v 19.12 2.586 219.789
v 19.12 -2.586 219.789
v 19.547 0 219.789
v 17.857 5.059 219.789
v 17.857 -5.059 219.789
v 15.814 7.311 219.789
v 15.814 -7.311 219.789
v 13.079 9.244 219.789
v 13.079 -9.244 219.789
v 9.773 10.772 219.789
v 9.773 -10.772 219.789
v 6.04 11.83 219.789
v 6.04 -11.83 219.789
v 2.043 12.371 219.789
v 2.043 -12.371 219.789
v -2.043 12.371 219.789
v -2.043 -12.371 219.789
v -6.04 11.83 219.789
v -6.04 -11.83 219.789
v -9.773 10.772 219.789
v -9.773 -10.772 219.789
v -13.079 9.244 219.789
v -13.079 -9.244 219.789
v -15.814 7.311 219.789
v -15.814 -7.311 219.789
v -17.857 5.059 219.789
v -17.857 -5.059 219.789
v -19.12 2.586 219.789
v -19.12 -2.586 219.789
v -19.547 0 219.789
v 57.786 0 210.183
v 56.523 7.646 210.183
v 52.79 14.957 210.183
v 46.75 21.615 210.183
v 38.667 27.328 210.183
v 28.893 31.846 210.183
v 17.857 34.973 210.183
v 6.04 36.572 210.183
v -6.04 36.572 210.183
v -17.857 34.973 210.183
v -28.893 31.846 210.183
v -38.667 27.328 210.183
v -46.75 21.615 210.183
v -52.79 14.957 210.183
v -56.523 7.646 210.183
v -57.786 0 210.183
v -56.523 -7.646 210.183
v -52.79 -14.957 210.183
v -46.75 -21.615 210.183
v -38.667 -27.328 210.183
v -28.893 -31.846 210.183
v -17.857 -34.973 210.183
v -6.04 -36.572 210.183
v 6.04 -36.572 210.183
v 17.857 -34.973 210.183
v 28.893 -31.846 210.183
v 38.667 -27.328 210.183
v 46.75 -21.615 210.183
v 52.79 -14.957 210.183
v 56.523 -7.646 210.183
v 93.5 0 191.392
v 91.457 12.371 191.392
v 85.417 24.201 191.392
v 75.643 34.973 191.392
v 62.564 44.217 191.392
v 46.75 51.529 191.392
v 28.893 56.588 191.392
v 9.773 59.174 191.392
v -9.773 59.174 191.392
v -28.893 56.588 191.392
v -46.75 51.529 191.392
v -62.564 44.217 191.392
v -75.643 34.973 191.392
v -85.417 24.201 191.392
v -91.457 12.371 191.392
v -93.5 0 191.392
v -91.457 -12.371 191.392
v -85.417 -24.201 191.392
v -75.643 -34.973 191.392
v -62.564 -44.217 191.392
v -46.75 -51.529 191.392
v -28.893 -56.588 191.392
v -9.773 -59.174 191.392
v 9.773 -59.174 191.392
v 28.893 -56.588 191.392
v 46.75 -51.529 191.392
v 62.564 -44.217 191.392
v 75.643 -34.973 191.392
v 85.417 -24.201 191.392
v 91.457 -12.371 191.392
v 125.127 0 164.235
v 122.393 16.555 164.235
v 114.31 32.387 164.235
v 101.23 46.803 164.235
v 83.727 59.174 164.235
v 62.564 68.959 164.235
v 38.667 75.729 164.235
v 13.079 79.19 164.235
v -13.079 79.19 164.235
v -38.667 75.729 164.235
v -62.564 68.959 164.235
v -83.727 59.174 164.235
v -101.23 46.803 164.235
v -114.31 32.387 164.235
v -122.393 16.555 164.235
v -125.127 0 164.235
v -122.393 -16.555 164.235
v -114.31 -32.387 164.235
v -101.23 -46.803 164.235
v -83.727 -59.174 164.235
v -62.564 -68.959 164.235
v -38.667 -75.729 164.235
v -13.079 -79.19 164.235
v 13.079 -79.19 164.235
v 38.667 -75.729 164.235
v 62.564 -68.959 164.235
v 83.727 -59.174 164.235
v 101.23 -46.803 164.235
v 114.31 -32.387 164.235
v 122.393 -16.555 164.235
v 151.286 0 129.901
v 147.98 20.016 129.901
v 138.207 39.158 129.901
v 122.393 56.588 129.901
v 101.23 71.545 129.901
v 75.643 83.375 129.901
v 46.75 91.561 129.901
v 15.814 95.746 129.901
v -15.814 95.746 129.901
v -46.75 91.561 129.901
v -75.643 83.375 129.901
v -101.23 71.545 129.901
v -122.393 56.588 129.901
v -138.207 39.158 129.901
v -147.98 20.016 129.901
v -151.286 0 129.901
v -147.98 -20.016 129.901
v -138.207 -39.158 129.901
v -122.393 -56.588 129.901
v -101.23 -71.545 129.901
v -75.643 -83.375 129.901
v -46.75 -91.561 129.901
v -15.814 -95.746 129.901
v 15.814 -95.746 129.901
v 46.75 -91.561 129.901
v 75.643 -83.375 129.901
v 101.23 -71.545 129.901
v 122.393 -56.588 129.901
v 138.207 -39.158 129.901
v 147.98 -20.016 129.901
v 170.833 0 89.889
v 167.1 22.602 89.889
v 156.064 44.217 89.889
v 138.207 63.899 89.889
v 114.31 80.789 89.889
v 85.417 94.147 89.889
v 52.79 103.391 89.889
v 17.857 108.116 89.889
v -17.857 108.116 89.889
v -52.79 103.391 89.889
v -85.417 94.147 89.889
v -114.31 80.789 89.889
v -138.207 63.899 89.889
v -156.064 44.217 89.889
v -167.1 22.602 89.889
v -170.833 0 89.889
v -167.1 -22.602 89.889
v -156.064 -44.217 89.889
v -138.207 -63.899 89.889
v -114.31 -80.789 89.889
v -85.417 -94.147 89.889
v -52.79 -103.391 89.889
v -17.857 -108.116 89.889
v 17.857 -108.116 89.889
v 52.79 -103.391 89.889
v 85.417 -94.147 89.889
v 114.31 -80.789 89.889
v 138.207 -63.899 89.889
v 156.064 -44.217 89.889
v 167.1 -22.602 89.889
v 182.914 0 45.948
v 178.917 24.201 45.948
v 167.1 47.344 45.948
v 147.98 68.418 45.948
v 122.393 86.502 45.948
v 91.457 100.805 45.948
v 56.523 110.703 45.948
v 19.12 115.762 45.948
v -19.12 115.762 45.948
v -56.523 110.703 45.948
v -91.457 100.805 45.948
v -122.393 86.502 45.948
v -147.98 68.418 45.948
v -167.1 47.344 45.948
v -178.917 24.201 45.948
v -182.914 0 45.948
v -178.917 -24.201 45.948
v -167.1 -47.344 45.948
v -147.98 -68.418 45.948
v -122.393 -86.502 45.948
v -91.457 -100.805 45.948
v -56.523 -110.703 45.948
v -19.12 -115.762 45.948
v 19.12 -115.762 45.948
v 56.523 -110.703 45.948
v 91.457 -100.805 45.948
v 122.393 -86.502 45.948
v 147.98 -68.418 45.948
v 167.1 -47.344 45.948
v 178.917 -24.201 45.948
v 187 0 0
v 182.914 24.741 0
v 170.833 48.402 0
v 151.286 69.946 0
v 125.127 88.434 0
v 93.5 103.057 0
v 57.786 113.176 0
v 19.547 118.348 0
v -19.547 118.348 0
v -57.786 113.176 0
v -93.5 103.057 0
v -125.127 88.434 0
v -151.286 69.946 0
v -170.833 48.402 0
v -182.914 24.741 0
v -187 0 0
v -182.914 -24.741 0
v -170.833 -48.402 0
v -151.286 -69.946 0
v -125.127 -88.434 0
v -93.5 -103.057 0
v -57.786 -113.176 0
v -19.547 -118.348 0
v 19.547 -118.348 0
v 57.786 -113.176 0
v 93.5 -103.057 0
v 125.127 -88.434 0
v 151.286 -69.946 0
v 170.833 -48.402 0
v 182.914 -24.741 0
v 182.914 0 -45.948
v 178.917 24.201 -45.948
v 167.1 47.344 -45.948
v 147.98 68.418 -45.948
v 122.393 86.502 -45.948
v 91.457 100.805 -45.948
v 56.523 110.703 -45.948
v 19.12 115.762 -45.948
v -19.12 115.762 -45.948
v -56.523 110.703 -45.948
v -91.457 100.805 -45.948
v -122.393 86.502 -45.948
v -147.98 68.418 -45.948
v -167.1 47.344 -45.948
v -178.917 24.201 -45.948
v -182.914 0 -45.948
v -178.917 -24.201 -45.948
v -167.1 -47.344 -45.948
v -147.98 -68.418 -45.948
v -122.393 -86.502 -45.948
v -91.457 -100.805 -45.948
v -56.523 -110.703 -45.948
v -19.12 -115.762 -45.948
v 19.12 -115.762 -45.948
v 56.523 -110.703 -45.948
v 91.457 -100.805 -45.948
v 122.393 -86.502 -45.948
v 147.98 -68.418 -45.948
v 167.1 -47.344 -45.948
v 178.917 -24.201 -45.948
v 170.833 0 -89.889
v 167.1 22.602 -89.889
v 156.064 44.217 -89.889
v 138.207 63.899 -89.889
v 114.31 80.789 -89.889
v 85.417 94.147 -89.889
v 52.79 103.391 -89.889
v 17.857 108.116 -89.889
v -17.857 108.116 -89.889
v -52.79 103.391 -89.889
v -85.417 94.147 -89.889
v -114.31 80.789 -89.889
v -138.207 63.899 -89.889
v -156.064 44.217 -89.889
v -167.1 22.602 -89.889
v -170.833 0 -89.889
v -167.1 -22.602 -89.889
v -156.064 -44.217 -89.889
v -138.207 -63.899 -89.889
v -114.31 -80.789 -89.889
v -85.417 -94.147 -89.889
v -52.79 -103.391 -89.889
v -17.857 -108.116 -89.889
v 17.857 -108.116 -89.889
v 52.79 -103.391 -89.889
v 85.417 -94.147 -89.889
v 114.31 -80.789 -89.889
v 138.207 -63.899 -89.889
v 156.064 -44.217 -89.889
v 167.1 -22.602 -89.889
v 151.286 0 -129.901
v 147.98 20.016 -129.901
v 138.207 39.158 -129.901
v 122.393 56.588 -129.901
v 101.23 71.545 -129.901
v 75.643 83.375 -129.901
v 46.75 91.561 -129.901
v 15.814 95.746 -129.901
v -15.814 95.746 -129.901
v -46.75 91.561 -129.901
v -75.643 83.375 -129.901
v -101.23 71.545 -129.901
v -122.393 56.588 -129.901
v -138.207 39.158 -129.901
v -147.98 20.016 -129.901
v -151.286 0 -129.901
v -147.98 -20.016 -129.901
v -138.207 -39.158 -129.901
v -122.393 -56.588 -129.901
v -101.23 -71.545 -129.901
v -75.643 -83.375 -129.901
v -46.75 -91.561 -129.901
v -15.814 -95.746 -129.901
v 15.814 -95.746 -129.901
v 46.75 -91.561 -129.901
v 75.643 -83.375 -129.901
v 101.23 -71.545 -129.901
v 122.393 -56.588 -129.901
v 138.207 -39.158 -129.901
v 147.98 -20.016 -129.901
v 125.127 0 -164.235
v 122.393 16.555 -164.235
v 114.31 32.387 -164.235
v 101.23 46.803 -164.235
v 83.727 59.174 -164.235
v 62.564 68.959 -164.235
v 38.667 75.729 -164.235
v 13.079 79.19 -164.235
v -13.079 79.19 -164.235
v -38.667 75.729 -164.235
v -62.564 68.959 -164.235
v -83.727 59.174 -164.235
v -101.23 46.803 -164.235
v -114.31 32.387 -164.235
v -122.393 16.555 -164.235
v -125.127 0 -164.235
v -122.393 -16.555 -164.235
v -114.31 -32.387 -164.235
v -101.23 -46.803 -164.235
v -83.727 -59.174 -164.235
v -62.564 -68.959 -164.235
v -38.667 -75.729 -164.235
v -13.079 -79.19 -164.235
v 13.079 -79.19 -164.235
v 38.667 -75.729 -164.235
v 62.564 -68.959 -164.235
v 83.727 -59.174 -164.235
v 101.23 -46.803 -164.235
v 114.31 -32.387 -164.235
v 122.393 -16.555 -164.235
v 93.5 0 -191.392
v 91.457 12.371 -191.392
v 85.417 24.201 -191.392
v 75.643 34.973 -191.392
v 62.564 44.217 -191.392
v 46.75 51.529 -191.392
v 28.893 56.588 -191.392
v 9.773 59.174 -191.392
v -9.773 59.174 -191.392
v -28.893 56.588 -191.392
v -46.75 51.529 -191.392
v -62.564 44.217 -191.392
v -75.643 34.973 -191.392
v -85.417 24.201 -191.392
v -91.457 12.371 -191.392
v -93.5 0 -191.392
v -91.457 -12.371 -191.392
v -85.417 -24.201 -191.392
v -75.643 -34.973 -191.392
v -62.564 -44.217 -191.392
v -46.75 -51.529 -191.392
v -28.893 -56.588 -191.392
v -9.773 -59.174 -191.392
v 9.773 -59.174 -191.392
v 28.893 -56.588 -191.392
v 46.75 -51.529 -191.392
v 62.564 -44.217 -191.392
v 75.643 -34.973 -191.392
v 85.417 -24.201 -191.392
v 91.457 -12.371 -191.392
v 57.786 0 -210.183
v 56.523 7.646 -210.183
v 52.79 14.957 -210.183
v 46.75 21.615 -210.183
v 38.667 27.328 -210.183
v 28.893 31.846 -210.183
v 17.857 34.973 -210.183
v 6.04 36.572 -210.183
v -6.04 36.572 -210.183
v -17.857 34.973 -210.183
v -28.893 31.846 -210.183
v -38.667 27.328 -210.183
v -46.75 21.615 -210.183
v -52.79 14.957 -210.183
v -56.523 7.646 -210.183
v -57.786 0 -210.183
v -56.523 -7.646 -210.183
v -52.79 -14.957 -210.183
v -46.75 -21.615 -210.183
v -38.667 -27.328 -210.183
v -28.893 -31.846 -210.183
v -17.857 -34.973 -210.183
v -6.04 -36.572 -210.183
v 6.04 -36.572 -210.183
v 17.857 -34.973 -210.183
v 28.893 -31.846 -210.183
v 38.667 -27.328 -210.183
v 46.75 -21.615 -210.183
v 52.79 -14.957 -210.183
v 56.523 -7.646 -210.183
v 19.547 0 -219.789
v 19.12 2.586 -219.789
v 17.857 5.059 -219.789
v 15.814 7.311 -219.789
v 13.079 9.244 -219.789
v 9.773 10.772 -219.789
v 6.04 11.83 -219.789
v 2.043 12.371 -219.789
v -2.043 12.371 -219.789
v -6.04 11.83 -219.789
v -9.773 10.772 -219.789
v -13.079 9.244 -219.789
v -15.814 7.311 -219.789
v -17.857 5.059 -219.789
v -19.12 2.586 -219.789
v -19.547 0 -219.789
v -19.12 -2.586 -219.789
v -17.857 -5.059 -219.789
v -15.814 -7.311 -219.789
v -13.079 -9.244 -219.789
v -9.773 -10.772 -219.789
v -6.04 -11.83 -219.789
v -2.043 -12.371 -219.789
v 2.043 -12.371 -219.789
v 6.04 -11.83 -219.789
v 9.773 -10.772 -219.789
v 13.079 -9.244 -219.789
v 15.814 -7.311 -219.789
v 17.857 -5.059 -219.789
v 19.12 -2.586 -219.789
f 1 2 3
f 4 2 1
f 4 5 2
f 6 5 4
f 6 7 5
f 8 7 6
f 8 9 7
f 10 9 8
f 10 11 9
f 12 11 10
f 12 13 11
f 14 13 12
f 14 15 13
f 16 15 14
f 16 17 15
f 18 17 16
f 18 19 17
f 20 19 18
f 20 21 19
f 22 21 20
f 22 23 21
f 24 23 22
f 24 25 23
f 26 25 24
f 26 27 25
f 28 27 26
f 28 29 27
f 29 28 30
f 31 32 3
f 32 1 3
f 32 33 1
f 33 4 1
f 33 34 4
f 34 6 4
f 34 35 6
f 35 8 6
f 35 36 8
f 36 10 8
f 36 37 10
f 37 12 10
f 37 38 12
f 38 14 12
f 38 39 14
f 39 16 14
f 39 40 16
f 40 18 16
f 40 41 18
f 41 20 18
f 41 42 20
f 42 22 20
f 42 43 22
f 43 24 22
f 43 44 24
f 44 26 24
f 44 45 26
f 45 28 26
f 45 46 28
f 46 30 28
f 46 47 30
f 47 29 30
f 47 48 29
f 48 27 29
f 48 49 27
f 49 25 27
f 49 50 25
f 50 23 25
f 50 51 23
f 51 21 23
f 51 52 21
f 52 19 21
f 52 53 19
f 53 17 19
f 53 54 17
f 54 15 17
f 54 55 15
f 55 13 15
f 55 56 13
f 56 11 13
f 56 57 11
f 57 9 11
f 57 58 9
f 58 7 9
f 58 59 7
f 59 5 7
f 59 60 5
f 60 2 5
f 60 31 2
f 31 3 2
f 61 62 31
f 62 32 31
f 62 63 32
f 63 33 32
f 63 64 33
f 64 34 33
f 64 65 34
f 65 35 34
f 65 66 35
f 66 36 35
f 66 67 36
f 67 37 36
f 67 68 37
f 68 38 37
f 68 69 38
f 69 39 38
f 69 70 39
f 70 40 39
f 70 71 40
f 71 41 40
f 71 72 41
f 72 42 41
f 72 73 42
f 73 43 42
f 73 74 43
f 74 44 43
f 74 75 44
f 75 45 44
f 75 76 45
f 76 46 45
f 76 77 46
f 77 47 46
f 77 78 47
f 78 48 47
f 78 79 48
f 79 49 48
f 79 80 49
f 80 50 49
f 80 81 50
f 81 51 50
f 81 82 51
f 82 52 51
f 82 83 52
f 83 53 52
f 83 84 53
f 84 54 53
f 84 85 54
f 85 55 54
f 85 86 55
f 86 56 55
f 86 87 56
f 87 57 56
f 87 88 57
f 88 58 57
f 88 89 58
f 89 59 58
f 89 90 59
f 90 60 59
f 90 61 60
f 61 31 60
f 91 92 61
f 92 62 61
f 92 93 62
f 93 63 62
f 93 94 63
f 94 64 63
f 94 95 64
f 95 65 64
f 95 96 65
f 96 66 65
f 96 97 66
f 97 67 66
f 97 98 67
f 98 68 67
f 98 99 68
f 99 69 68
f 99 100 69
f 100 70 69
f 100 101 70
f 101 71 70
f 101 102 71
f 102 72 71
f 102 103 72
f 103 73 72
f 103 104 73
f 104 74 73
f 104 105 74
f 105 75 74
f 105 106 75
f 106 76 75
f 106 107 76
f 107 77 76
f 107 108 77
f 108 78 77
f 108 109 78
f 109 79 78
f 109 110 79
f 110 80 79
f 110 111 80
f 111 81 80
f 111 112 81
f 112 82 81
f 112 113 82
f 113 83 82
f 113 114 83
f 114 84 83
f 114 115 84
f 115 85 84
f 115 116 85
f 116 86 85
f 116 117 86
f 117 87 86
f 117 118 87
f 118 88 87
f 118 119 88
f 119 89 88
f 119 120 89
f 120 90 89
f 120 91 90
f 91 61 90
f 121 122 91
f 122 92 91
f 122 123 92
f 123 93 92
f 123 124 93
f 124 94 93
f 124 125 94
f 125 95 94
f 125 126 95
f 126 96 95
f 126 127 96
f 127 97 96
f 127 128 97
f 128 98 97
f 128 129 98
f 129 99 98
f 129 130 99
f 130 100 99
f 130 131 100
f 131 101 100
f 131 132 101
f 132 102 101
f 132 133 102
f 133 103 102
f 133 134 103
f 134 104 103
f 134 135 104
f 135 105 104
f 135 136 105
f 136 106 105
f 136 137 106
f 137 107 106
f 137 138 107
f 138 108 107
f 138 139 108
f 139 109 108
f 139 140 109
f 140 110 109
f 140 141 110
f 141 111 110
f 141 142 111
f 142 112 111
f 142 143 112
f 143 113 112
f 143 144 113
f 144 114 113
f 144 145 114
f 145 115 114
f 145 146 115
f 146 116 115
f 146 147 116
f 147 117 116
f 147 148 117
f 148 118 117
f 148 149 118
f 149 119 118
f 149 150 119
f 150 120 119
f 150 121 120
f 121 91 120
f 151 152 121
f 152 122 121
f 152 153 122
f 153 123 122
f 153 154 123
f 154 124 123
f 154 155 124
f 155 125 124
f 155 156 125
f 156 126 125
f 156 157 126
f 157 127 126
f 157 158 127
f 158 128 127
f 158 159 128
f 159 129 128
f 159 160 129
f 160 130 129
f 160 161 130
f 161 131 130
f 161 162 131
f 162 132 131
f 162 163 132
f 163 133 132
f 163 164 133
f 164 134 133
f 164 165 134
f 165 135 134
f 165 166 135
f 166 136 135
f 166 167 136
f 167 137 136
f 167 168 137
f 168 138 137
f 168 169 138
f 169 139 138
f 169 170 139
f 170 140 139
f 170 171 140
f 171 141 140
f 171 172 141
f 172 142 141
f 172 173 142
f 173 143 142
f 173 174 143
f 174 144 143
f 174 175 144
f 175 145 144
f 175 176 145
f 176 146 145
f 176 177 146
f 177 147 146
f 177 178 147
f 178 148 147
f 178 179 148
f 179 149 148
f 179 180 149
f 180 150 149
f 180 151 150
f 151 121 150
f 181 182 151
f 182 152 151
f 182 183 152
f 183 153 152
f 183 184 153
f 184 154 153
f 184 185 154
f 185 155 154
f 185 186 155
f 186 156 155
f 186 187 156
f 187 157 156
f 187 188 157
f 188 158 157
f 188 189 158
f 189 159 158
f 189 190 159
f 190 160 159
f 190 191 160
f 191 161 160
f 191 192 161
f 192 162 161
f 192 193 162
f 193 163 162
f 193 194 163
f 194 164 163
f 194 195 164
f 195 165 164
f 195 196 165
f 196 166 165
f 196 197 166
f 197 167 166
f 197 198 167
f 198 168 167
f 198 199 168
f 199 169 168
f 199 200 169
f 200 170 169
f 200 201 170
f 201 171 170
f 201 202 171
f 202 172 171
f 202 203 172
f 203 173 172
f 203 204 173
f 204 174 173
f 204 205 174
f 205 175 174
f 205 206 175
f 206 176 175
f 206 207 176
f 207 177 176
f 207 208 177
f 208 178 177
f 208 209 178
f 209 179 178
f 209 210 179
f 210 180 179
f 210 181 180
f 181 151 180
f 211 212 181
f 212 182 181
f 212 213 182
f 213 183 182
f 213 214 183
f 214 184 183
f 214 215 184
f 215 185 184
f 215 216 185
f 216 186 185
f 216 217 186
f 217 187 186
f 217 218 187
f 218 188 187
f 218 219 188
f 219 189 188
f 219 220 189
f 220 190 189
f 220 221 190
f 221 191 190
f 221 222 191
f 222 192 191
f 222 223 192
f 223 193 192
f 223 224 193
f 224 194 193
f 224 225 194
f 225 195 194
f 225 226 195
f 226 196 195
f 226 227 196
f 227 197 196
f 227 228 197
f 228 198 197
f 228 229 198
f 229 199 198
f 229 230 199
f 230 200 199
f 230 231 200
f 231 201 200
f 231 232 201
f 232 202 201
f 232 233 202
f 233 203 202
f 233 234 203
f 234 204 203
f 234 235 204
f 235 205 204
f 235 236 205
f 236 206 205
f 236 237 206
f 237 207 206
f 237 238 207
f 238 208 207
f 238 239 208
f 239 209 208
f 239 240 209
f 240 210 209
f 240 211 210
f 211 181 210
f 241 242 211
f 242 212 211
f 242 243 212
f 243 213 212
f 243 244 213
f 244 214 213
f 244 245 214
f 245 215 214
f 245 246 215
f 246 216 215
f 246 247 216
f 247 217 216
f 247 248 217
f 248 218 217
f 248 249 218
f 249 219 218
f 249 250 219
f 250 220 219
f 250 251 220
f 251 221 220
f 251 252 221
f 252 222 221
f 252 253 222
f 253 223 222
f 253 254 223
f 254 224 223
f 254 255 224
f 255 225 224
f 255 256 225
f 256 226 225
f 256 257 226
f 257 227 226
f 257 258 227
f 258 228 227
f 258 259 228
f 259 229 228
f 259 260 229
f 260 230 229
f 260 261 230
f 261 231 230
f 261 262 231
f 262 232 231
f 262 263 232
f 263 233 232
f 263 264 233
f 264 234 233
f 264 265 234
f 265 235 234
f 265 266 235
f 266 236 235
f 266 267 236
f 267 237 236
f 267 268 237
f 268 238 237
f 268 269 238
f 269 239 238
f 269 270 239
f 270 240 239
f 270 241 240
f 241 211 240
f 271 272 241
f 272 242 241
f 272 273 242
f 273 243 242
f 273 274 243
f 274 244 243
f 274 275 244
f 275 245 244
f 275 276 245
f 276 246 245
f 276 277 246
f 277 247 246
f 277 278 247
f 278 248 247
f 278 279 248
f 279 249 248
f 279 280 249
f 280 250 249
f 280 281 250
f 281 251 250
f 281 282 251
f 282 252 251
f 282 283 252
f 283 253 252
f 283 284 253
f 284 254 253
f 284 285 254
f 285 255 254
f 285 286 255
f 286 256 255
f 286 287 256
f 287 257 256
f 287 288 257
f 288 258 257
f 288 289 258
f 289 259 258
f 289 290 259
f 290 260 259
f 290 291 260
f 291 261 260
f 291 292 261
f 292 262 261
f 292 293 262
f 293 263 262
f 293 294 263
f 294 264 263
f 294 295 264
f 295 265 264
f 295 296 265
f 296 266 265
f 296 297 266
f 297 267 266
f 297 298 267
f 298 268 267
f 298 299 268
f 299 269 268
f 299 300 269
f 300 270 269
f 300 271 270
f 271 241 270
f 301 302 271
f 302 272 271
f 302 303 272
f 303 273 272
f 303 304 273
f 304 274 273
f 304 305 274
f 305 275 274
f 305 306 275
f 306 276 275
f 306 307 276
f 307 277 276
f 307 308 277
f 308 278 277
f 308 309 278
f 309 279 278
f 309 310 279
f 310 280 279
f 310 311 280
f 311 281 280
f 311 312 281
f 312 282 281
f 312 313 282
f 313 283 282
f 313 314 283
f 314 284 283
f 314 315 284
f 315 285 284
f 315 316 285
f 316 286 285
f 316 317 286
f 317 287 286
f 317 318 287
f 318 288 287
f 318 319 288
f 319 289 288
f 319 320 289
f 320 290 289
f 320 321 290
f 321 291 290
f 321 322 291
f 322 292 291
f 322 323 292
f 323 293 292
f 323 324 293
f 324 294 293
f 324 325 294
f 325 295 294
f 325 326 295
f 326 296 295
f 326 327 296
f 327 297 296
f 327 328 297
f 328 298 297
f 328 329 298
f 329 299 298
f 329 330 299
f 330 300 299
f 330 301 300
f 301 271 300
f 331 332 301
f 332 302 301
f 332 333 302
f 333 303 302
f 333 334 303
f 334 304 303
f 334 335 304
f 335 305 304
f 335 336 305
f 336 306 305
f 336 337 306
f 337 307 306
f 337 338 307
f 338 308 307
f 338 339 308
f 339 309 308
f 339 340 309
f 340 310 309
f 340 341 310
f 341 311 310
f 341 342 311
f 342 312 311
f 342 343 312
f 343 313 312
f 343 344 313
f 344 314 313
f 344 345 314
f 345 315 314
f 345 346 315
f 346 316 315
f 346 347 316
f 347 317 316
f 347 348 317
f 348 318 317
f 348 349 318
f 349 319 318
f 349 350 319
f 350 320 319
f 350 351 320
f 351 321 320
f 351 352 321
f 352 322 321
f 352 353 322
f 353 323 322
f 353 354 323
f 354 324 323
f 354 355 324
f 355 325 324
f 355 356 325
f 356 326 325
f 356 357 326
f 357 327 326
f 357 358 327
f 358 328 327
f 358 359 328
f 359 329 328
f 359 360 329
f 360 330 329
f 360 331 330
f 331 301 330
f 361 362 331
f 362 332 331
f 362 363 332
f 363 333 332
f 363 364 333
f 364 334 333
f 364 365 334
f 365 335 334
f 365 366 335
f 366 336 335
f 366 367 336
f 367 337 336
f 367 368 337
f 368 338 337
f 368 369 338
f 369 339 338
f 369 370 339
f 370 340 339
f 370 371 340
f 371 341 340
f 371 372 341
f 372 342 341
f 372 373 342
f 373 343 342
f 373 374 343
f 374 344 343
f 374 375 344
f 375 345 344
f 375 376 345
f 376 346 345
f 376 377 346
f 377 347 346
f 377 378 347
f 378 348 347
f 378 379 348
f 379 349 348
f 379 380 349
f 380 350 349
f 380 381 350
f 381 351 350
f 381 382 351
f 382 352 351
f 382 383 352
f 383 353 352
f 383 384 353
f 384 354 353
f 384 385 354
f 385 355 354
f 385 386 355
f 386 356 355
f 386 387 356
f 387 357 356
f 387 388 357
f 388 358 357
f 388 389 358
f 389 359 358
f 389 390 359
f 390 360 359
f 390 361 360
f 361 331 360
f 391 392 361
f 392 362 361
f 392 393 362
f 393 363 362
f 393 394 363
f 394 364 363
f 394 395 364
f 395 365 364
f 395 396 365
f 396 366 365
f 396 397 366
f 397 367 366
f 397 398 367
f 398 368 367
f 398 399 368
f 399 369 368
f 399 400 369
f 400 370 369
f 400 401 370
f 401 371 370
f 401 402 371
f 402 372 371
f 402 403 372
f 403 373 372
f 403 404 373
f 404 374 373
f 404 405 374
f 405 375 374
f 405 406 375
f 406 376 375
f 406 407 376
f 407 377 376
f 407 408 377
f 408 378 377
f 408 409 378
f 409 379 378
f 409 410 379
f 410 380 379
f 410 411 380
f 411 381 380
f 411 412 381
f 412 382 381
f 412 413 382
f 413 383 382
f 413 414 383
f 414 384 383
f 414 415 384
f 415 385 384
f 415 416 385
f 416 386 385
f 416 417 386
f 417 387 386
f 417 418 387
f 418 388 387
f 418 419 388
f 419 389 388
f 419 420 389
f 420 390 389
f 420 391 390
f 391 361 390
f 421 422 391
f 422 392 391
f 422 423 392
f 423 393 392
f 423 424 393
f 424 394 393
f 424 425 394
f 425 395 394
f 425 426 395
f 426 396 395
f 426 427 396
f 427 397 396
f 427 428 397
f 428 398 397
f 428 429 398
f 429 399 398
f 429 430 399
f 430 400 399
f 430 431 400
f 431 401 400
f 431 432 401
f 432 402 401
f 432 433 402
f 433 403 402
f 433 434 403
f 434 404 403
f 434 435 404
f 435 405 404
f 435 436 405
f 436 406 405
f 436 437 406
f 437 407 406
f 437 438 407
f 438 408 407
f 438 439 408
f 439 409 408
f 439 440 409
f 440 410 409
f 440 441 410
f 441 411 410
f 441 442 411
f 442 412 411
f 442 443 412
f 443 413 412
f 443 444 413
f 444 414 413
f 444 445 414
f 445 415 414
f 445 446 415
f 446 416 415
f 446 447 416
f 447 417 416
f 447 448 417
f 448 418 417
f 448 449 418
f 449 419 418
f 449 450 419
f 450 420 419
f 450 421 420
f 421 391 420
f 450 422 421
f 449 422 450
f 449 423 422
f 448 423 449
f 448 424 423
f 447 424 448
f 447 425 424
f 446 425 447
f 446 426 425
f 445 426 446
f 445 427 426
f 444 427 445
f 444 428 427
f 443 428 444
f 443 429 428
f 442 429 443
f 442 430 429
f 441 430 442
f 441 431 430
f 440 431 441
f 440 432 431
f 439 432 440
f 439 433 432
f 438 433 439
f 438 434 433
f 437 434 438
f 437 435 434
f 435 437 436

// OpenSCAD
// Generated by SolidPython 1.0.1 on 2020-07-29 00:46:49


scale(v = [11, 7, 13]) {
	sphere(r = 17);
}
/***********************************************
*********      SolidPython code:      **********
************************************************
 
# import packages: SolidPython
from solid import *
from solid.utils import *
from itertools import chain, combinations, permutations


class Resize:

    def __init__(self, scad_file):
        self.scad_file = scad_file
        #self.scad_file = import_scad(scad_file)
        # cone/cylinder param:
        self.r1 = 0
        self.r2 = 0
        self.h = 0
        # rectangular prism param:
        self.w = 0
        self.l = 0
        # ellipse param:
        self.r = 0

    # import OpenScad code (file name corresponds to shape)


    # classify shape + parameters
    def assign(self, param1, param2, param3):
        if self.scad_file == 'cone.scad':
            self.r1 = param1
            self.r2 = param2
            self.h = param3
        elif self.scad_file == 'cylinder.scad':
            self.r1 = param1
            self.r2 = param2
            self.h = param3
        elif self.scad_file == 'rectangularPrism.scad':
            self.h = param1
            self.l = param2
            self.w = param3
        else:
            self.r = param1
            self.h = param2

    # resize parameters
    def iterate(self):
        x = range(3, 20, 2)
        i = 1
        if self.scad_file == 'cone.scad':
            tempList = list(permutations(x, 2))
            for temp in tempList:
                param1 = temp[0]
                param2 = temp[1]
                filepath = 'produced_scad_files/' + 'cone' + str(param1) + '_' + str(param2) + '_' + '.scad'
                scad_render_to_file(cylinder(h=param1, r1=param2, r2=0), filepath)

        elif self.scad_file == 'cylinder.scad':
            tempList = list(permutations(x, 3))
            for temp in tempList:
                param1 = temp[0]
                param2 = temp[1]
                filepath = 'produced_scad_files/' + 'cylinder' + str(param1) + '_' + str(param2) + '_' + '.scad'
                scad_render_to_file(cylinder(h=param1, r1=param2, r2=param2), filepath)

        elif self.scad_file == 'rectangularPrism.scad':
            tempList = list(permutations(x, 3))
            for temp in tempList:
                param1 = temp[0]
                param2 = temp[1]
                param3 = temp[2]
                filepath = 'produced_scad_files/' + 'rectangularPrism' + str(param1) + '_' + str(param2) + '_' + str(
                    param3) + '.scad'
                scad_render_to_file(cube(size=(param1, param2, param3)), filepath)

        elif self.scad_file == 'ellipse.scad':
            tempList = list(permutations(x, 4))
            for temp in tempList:
                param1 = temp[0]
                param2 = temp[1]
                param3 = temp[2]
                param4 = temp[3]
                filepath = 'produced_scad_files/' + 'ellipse' + str(param1) + '_' + str(param2) + '_' + str(param3) + '_' + str(param4) + '.scad'
                scad_render_to_file(scale([param1, param2, param3])(sphere(r=param4)), filepath)

    def render_to_scadfile(self):
        scad_render_to_file(scad, 'example.scad') 
 
************************************************/
